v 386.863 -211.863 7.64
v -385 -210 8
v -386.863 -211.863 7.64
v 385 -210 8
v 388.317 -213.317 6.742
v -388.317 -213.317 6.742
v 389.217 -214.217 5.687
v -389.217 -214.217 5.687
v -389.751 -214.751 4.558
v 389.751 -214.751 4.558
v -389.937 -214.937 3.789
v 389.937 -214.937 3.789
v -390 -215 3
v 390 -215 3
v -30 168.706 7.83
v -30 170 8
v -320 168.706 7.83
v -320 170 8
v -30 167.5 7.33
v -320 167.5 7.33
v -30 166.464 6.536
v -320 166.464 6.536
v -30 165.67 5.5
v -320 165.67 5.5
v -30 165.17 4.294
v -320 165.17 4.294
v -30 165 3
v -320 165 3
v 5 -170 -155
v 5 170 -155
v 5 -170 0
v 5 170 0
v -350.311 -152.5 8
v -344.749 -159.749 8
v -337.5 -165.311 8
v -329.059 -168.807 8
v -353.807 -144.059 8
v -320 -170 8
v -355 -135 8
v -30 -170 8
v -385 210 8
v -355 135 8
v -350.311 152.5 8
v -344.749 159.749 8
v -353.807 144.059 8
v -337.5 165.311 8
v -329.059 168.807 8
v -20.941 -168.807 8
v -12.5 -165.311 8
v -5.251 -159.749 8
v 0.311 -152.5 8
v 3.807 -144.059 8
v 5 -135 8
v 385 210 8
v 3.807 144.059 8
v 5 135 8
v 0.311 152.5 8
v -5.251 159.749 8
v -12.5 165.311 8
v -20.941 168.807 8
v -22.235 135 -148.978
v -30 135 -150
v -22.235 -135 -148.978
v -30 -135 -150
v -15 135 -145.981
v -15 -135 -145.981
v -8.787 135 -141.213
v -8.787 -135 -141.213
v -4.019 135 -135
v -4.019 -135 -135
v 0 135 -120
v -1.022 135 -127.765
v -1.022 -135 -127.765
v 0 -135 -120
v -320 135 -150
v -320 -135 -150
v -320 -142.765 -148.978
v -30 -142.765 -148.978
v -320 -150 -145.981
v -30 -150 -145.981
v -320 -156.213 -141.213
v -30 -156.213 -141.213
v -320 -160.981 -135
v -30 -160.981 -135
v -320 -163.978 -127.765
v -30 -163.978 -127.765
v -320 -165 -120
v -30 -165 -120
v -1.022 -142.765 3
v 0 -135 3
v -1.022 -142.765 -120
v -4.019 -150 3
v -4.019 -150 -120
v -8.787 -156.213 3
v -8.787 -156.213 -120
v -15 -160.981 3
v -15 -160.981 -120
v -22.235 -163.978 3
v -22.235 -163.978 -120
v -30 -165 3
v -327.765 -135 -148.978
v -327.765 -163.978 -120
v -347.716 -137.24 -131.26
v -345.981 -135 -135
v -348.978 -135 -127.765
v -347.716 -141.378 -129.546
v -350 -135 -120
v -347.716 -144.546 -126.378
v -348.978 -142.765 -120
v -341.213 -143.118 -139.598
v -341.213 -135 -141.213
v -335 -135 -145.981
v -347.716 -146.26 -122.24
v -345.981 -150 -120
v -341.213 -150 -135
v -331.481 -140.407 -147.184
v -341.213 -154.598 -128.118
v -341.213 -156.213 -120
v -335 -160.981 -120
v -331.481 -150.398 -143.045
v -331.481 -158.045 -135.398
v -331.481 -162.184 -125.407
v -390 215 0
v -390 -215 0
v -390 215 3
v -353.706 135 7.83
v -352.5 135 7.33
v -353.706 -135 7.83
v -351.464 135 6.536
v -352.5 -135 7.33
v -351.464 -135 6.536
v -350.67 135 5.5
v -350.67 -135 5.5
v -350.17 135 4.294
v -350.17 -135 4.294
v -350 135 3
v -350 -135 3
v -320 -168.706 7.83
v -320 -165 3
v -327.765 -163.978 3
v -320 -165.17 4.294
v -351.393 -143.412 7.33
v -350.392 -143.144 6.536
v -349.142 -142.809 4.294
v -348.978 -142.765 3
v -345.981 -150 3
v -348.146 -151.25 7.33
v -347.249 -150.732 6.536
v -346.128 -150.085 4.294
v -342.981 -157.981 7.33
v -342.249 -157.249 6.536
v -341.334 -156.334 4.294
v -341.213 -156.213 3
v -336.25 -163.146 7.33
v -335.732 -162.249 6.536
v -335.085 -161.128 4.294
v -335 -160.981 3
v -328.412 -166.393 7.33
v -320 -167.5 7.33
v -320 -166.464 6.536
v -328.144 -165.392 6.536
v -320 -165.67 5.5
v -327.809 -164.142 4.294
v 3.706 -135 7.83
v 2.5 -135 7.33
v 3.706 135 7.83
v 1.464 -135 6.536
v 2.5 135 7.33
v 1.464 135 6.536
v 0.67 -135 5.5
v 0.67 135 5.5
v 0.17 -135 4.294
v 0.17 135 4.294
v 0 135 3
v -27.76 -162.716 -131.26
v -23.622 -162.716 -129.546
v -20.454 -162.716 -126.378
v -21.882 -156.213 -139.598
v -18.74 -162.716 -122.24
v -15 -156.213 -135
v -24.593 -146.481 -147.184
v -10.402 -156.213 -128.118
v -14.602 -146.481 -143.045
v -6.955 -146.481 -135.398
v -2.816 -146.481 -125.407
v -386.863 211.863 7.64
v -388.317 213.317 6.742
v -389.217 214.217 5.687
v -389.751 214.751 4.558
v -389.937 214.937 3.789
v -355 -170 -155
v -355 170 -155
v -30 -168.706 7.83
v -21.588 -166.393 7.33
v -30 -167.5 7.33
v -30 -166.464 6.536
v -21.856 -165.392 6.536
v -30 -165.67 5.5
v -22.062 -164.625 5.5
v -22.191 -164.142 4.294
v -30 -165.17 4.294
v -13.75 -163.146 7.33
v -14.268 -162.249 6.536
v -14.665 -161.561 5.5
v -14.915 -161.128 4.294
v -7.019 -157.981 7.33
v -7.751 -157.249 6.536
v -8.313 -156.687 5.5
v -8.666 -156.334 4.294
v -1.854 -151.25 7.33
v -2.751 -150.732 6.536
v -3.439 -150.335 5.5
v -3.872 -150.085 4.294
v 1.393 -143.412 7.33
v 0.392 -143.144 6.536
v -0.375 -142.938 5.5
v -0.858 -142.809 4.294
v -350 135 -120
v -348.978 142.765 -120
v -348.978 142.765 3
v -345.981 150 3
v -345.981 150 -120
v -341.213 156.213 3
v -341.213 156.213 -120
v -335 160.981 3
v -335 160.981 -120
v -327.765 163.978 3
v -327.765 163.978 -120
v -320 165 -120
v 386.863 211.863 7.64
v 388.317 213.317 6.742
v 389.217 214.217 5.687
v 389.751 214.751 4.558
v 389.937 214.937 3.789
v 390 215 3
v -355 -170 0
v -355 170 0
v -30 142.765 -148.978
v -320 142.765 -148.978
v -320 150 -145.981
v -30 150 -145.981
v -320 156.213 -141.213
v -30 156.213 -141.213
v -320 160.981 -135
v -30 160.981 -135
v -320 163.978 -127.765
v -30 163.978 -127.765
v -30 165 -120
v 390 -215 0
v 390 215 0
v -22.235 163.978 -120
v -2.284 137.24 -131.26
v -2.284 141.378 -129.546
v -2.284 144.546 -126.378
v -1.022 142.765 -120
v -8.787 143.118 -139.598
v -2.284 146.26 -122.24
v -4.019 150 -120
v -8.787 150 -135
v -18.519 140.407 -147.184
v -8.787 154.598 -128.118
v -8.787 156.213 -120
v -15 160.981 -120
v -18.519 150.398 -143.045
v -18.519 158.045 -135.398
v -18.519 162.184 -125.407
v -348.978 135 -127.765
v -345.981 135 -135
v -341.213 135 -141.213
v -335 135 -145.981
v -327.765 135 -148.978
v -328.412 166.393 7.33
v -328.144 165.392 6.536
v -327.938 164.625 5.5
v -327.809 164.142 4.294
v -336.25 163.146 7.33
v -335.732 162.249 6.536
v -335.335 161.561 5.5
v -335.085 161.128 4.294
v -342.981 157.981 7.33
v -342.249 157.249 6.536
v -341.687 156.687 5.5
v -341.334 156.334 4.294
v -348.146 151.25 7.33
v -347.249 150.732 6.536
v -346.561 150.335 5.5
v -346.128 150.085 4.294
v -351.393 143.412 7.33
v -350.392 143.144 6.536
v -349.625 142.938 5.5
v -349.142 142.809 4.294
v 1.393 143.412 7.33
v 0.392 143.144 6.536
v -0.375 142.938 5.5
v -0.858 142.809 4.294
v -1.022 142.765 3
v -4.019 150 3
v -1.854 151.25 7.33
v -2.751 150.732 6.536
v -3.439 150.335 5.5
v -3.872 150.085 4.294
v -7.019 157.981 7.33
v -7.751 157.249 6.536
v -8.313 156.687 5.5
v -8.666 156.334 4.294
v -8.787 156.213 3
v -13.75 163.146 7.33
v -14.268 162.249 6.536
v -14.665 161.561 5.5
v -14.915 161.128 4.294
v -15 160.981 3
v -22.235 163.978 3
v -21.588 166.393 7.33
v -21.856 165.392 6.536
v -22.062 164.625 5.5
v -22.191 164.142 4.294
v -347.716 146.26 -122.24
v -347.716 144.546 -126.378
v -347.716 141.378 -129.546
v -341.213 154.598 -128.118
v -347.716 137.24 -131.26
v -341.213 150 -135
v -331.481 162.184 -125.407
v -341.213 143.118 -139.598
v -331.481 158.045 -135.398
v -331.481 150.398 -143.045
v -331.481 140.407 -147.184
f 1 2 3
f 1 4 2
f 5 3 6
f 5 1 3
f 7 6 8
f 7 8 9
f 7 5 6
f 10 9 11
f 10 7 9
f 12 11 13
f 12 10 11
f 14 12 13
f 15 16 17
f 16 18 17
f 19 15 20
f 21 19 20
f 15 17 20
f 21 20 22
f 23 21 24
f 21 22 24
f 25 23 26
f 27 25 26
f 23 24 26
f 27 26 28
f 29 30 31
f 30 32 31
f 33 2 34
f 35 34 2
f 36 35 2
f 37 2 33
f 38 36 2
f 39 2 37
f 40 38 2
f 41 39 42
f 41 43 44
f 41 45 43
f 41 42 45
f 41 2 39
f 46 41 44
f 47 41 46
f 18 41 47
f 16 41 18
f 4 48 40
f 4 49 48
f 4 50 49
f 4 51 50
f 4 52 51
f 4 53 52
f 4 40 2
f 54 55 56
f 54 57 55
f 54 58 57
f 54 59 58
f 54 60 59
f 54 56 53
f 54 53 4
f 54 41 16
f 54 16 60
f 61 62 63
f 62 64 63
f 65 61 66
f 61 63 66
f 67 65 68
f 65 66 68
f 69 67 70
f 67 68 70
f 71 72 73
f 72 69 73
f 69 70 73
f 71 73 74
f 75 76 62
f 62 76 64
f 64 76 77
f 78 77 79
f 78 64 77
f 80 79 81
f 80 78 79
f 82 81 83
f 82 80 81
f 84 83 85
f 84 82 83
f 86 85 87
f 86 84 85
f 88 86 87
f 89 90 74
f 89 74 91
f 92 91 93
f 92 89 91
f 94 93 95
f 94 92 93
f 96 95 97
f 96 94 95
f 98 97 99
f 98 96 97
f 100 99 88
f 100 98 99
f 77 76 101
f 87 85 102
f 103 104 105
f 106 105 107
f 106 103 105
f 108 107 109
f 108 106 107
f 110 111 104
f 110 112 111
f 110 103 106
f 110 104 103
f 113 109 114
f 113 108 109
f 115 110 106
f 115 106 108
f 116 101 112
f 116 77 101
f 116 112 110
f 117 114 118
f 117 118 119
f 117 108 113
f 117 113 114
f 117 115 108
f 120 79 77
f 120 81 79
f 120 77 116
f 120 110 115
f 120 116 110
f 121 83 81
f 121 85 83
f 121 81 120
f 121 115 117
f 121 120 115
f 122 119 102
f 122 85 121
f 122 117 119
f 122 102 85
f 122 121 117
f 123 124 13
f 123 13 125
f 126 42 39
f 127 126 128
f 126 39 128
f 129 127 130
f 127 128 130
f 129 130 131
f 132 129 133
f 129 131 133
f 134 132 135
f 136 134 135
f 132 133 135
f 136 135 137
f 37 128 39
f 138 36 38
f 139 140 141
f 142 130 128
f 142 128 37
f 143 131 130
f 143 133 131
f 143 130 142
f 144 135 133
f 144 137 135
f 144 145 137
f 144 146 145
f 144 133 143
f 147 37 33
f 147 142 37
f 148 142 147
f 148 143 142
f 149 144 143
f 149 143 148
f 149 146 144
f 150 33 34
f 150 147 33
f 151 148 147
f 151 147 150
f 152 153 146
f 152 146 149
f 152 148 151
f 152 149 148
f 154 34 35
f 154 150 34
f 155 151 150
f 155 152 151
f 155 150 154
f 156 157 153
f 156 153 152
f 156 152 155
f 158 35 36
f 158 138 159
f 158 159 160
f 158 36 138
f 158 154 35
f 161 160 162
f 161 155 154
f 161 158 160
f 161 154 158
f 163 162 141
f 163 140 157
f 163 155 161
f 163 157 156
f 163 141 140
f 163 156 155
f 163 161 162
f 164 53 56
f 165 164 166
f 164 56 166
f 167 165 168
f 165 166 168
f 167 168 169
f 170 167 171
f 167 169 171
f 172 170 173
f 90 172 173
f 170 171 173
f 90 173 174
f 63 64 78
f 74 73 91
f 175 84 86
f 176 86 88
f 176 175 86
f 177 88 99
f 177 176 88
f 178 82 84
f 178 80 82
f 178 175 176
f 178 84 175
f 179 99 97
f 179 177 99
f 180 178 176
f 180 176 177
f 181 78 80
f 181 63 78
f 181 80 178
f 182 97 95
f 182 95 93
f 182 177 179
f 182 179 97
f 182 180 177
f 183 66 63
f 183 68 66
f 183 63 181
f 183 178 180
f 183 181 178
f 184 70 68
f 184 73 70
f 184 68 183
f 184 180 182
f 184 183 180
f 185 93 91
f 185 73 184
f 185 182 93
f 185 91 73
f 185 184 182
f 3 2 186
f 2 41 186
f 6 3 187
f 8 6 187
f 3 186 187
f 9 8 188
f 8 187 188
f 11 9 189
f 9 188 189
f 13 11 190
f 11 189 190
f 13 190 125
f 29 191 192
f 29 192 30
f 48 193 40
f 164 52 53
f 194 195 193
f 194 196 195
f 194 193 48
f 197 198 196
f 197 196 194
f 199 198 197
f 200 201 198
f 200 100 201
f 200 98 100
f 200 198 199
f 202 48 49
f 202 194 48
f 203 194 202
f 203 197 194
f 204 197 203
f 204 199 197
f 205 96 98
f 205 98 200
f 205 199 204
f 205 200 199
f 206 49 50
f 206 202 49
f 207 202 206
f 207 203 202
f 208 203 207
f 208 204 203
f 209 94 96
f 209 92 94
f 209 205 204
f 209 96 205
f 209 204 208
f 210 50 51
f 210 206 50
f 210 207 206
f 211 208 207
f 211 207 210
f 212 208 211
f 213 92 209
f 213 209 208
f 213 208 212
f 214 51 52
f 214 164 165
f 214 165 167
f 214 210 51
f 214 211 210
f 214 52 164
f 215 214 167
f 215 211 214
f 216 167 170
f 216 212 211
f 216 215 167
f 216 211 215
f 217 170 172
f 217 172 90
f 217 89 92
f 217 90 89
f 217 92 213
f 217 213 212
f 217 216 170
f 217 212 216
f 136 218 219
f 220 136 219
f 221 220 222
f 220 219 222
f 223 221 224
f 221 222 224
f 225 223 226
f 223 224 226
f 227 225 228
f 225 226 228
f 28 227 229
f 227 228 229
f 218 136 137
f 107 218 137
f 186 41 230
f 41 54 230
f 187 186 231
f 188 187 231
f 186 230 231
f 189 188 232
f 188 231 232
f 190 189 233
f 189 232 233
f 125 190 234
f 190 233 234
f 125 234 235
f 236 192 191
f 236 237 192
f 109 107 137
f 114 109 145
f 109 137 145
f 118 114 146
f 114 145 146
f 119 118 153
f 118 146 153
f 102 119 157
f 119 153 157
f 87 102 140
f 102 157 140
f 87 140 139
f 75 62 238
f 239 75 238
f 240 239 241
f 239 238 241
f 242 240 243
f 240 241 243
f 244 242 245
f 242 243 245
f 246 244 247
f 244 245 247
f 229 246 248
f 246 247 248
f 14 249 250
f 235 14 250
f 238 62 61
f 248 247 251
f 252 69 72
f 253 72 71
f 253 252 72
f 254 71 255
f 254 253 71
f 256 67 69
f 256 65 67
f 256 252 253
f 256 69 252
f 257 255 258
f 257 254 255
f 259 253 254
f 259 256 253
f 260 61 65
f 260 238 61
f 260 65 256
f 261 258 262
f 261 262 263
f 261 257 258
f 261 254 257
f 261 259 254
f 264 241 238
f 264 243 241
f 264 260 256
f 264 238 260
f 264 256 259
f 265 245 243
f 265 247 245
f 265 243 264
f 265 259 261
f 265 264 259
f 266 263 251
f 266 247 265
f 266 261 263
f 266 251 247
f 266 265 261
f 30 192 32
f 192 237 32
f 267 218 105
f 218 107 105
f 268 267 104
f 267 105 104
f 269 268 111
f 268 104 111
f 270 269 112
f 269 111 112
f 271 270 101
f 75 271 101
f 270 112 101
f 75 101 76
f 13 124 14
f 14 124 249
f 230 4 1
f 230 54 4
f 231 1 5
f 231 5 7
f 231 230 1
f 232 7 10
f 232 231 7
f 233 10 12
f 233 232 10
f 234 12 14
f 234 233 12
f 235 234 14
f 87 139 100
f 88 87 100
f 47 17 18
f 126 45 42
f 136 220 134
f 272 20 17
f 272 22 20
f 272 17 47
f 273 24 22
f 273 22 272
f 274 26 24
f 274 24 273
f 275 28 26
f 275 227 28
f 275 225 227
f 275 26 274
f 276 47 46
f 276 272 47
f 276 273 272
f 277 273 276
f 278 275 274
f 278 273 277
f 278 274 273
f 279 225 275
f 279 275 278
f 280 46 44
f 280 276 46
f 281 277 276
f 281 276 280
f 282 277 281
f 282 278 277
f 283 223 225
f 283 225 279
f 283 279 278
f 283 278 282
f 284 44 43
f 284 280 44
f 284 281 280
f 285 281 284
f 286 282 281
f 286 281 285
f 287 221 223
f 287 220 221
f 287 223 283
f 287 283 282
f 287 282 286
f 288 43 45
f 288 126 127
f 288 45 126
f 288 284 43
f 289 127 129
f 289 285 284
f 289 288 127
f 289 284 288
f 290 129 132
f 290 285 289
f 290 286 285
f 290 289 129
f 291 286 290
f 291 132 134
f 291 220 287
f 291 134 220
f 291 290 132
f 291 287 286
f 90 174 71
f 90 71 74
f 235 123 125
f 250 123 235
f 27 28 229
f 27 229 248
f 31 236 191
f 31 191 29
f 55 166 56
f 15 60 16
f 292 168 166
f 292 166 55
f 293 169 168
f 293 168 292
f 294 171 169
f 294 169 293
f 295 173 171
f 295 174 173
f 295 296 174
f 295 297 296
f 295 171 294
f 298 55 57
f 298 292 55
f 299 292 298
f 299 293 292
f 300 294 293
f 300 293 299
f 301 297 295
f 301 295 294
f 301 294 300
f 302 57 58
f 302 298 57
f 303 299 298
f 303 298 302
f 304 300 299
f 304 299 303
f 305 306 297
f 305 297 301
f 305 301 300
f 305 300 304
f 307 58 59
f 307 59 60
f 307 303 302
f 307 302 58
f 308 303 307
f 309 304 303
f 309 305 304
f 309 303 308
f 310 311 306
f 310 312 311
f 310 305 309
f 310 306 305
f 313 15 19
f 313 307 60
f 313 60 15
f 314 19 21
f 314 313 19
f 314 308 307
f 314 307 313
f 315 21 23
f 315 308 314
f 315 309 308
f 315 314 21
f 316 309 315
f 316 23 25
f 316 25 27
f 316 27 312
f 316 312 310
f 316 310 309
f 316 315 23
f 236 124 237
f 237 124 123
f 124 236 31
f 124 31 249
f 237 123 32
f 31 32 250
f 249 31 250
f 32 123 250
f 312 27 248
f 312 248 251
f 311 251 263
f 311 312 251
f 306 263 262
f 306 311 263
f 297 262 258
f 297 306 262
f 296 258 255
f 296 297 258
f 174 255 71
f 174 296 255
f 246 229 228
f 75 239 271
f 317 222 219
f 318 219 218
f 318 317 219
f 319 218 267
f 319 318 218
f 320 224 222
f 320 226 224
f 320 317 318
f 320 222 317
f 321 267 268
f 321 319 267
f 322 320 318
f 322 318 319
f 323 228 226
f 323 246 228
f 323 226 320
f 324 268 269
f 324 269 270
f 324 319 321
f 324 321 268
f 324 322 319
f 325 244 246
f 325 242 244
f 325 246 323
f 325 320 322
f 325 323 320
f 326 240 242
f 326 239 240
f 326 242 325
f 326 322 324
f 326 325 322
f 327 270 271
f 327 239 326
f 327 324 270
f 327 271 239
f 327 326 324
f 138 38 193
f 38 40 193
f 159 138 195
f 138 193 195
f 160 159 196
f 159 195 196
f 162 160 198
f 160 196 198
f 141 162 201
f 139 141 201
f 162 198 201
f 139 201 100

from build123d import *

# Parameters (mm, degrees)
F0_W     = 780
F0_H     = 430
F1_DEPTH = 8
F3_W     = 350
F3_H     = 330
F4_DEPTH = 25
F5_W     = 360
F5_H     = 340
F5_W_2   = 350
F5_H_2   = 330
F6_DEPTH = 150
F7_W     = 360
F7_H     = 340
F7_W_2   = 350
F7_H_2   = 330
F8_DEPTH = 5
F9_R     = 30
F10_R    = 5


with BuildPart() as f1:
    # F0 (on Top) → F1 (new body)
    with BuildSketch(Plane.XY):
        Rectangle(F0_W, F0_H)
    extrude(amount=F1_DEPTH)

    # F3 (on face) → F4 (cut)
    with BuildSketch(Plane.XY.offset(8)):
        with Locations((-175, 0)):
            Rectangle(F3_W, F3_H)
    extrude(amount=-F4_DEPTH, mode=Mode.SUBTRACT)

    # F5 (on face) → F6 (join)
    with BuildSketch(Plane(origin=(0, 0, 0), x_dir=(1, 0, 0), z_dir=(0, 0, -1))):
        with Locations((-175, 0)):
            Rectangle(F5_W, F5_H)
        with Locations((-175, 0)):
            Rectangle(F5_W_2, F5_H_2, mode=Mode.SUBTRACT)
    extrude(amount=F6_DEPTH)

    # F7 (on face) → F8 (join)
    with BuildSketch(Plane(origin=(0, 0, -150), x_dir=(1, 0, 0), z_dir=(0, 0, -1))):
        with Locations((-175, 0)):
            Rectangle(F7_W, F7_H)
        with Locations((-175, 0)):
            Rectangle(F7_W_2, F7_H_2, mode=Mode.SUBTRACT)
        with Locations((-175, 0)):
            Rectangle(F7_W_2, F7_H_2)
    extrude(amount=F8_DEPTH)

    # F9
    f9_edges = [f1.edges().sort_by_distance(p)[0] for p in [
        (-175, 165, -150),
        (0, 0, -150),
        (-175, -165, -150),
        (0, -165, -71),
        (0, 165, -71),
        (-350, 165, -71),
        (-350, 0, -150),
        (-350, -165, -71),
    ]]
    fillet(f9_edges, radius=F9_R)

    # F10
    f10_edges = [f1.edges().sort_by_distance(p)[0] for p in [
        (-390, 0, 8),
        (-175, -165, 8),
        (-341.213203, -156.213203, 8),
        (-8.786797, -156.213203, 8),
        (-350, 0, 8),
        (0, 0, 8),
        (-341.213203, 156.213203, 8),
        (-8.786797, 156.213203, 8),
        (-175, 165, 8),
        (390, 0, 8),
        (0, -215, 8),
        (0, 215, 8),
    ]]
    fillet(f10_edges, radius=F10_R)


solid = f1.part
